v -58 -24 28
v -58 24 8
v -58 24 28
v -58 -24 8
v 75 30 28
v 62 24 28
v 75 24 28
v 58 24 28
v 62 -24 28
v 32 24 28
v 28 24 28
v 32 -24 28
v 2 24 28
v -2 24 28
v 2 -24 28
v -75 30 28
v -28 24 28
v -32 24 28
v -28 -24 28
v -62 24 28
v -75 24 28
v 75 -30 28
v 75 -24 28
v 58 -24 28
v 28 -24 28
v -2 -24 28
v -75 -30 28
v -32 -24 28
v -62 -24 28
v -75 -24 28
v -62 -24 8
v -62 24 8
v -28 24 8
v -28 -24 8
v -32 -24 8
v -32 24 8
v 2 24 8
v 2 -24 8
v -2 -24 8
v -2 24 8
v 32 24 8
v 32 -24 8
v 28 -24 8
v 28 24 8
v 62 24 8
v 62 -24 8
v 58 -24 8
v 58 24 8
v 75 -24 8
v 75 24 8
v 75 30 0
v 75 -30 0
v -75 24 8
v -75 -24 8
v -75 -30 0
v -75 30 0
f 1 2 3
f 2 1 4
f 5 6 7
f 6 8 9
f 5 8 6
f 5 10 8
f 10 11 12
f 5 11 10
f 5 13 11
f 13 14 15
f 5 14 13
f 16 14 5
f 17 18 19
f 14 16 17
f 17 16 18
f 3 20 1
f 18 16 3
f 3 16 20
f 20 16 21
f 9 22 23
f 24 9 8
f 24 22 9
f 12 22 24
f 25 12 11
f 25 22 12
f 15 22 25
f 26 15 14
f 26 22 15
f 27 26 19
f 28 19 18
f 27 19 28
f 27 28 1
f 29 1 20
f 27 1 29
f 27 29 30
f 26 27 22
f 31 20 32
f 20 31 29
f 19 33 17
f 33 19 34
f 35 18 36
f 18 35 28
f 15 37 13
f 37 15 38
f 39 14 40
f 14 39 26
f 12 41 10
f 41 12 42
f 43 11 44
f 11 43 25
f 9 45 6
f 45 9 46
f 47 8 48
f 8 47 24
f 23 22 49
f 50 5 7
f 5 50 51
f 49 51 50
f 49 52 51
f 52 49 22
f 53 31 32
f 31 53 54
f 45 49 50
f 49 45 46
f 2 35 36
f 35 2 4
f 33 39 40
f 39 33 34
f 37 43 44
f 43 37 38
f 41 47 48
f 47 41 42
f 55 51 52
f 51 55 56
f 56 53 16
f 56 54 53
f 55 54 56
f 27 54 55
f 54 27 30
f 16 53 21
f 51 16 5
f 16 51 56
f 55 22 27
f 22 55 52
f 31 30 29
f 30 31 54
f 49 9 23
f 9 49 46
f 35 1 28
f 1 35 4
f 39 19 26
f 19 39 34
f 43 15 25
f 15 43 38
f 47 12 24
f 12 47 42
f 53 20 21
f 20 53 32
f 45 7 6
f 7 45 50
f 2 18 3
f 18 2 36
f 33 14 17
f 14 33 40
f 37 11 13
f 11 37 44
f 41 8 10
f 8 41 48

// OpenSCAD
$fn = 32;

// ----------------------------------------------------------------------
// Rib frame 150 x 60 x 28
// 5 ribs at 30 mm pitch
// ----------------------------------------------------------------------

// --- parameters (mm) ---
frame = [150, 60, 8];  // base plate size (x, y, z)
rail_w = 6;            // side rail width
ribs = 5;              // number of ribs
rib_t = 4;             // rib thickness
rib_h = 20;            // rib height above the base plate
pitch = 30;            // pitch between rib centres

// --- derived feature positions (mm) ---
span = (ribs - 1) * pitch;          // = 120   distance between the outer ribs
origin_x = -span / 2;               // = -60   X of the first rib
rib_len = frame[1] - 2 * rail_w + 2;  // = 50   rib length, 1 mm into each rail
feature_centers = [
  [origin_x + 0 * pitch, 0],
  [origin_x + 1 * pitch, 0],
  [origin_x + 2 * pitch, 0],
  [origin_x + 3 * pitch, 0],
  [origin_x + 4 * pitch, 0]
];   // rib centre line, drives the rib loop

// base plate, two side rails, then the ribs read straight off feature_centers
union() {
  translate([-frame[0] / 2, -frame[1] / 2, 0]) cube(frame);
  translate([-frame[0] / 2, -frame[1] / 2, 0]) cube([frame[0], rail_w, frame[2] + rib_h]);
  translate([-frame[0] / 2, frame[1] / 2 - rail_w, 0]) cube([frame[0], rail_w, frame[2] + rib_h]);
  for (centre = feature_centers)
    translate([centre[0] - rib_t / 2, centre[1] - rib_len / 2, frame[2] - 1])
      cube([rib_t, rib_len, rib_h + 1]);
}
